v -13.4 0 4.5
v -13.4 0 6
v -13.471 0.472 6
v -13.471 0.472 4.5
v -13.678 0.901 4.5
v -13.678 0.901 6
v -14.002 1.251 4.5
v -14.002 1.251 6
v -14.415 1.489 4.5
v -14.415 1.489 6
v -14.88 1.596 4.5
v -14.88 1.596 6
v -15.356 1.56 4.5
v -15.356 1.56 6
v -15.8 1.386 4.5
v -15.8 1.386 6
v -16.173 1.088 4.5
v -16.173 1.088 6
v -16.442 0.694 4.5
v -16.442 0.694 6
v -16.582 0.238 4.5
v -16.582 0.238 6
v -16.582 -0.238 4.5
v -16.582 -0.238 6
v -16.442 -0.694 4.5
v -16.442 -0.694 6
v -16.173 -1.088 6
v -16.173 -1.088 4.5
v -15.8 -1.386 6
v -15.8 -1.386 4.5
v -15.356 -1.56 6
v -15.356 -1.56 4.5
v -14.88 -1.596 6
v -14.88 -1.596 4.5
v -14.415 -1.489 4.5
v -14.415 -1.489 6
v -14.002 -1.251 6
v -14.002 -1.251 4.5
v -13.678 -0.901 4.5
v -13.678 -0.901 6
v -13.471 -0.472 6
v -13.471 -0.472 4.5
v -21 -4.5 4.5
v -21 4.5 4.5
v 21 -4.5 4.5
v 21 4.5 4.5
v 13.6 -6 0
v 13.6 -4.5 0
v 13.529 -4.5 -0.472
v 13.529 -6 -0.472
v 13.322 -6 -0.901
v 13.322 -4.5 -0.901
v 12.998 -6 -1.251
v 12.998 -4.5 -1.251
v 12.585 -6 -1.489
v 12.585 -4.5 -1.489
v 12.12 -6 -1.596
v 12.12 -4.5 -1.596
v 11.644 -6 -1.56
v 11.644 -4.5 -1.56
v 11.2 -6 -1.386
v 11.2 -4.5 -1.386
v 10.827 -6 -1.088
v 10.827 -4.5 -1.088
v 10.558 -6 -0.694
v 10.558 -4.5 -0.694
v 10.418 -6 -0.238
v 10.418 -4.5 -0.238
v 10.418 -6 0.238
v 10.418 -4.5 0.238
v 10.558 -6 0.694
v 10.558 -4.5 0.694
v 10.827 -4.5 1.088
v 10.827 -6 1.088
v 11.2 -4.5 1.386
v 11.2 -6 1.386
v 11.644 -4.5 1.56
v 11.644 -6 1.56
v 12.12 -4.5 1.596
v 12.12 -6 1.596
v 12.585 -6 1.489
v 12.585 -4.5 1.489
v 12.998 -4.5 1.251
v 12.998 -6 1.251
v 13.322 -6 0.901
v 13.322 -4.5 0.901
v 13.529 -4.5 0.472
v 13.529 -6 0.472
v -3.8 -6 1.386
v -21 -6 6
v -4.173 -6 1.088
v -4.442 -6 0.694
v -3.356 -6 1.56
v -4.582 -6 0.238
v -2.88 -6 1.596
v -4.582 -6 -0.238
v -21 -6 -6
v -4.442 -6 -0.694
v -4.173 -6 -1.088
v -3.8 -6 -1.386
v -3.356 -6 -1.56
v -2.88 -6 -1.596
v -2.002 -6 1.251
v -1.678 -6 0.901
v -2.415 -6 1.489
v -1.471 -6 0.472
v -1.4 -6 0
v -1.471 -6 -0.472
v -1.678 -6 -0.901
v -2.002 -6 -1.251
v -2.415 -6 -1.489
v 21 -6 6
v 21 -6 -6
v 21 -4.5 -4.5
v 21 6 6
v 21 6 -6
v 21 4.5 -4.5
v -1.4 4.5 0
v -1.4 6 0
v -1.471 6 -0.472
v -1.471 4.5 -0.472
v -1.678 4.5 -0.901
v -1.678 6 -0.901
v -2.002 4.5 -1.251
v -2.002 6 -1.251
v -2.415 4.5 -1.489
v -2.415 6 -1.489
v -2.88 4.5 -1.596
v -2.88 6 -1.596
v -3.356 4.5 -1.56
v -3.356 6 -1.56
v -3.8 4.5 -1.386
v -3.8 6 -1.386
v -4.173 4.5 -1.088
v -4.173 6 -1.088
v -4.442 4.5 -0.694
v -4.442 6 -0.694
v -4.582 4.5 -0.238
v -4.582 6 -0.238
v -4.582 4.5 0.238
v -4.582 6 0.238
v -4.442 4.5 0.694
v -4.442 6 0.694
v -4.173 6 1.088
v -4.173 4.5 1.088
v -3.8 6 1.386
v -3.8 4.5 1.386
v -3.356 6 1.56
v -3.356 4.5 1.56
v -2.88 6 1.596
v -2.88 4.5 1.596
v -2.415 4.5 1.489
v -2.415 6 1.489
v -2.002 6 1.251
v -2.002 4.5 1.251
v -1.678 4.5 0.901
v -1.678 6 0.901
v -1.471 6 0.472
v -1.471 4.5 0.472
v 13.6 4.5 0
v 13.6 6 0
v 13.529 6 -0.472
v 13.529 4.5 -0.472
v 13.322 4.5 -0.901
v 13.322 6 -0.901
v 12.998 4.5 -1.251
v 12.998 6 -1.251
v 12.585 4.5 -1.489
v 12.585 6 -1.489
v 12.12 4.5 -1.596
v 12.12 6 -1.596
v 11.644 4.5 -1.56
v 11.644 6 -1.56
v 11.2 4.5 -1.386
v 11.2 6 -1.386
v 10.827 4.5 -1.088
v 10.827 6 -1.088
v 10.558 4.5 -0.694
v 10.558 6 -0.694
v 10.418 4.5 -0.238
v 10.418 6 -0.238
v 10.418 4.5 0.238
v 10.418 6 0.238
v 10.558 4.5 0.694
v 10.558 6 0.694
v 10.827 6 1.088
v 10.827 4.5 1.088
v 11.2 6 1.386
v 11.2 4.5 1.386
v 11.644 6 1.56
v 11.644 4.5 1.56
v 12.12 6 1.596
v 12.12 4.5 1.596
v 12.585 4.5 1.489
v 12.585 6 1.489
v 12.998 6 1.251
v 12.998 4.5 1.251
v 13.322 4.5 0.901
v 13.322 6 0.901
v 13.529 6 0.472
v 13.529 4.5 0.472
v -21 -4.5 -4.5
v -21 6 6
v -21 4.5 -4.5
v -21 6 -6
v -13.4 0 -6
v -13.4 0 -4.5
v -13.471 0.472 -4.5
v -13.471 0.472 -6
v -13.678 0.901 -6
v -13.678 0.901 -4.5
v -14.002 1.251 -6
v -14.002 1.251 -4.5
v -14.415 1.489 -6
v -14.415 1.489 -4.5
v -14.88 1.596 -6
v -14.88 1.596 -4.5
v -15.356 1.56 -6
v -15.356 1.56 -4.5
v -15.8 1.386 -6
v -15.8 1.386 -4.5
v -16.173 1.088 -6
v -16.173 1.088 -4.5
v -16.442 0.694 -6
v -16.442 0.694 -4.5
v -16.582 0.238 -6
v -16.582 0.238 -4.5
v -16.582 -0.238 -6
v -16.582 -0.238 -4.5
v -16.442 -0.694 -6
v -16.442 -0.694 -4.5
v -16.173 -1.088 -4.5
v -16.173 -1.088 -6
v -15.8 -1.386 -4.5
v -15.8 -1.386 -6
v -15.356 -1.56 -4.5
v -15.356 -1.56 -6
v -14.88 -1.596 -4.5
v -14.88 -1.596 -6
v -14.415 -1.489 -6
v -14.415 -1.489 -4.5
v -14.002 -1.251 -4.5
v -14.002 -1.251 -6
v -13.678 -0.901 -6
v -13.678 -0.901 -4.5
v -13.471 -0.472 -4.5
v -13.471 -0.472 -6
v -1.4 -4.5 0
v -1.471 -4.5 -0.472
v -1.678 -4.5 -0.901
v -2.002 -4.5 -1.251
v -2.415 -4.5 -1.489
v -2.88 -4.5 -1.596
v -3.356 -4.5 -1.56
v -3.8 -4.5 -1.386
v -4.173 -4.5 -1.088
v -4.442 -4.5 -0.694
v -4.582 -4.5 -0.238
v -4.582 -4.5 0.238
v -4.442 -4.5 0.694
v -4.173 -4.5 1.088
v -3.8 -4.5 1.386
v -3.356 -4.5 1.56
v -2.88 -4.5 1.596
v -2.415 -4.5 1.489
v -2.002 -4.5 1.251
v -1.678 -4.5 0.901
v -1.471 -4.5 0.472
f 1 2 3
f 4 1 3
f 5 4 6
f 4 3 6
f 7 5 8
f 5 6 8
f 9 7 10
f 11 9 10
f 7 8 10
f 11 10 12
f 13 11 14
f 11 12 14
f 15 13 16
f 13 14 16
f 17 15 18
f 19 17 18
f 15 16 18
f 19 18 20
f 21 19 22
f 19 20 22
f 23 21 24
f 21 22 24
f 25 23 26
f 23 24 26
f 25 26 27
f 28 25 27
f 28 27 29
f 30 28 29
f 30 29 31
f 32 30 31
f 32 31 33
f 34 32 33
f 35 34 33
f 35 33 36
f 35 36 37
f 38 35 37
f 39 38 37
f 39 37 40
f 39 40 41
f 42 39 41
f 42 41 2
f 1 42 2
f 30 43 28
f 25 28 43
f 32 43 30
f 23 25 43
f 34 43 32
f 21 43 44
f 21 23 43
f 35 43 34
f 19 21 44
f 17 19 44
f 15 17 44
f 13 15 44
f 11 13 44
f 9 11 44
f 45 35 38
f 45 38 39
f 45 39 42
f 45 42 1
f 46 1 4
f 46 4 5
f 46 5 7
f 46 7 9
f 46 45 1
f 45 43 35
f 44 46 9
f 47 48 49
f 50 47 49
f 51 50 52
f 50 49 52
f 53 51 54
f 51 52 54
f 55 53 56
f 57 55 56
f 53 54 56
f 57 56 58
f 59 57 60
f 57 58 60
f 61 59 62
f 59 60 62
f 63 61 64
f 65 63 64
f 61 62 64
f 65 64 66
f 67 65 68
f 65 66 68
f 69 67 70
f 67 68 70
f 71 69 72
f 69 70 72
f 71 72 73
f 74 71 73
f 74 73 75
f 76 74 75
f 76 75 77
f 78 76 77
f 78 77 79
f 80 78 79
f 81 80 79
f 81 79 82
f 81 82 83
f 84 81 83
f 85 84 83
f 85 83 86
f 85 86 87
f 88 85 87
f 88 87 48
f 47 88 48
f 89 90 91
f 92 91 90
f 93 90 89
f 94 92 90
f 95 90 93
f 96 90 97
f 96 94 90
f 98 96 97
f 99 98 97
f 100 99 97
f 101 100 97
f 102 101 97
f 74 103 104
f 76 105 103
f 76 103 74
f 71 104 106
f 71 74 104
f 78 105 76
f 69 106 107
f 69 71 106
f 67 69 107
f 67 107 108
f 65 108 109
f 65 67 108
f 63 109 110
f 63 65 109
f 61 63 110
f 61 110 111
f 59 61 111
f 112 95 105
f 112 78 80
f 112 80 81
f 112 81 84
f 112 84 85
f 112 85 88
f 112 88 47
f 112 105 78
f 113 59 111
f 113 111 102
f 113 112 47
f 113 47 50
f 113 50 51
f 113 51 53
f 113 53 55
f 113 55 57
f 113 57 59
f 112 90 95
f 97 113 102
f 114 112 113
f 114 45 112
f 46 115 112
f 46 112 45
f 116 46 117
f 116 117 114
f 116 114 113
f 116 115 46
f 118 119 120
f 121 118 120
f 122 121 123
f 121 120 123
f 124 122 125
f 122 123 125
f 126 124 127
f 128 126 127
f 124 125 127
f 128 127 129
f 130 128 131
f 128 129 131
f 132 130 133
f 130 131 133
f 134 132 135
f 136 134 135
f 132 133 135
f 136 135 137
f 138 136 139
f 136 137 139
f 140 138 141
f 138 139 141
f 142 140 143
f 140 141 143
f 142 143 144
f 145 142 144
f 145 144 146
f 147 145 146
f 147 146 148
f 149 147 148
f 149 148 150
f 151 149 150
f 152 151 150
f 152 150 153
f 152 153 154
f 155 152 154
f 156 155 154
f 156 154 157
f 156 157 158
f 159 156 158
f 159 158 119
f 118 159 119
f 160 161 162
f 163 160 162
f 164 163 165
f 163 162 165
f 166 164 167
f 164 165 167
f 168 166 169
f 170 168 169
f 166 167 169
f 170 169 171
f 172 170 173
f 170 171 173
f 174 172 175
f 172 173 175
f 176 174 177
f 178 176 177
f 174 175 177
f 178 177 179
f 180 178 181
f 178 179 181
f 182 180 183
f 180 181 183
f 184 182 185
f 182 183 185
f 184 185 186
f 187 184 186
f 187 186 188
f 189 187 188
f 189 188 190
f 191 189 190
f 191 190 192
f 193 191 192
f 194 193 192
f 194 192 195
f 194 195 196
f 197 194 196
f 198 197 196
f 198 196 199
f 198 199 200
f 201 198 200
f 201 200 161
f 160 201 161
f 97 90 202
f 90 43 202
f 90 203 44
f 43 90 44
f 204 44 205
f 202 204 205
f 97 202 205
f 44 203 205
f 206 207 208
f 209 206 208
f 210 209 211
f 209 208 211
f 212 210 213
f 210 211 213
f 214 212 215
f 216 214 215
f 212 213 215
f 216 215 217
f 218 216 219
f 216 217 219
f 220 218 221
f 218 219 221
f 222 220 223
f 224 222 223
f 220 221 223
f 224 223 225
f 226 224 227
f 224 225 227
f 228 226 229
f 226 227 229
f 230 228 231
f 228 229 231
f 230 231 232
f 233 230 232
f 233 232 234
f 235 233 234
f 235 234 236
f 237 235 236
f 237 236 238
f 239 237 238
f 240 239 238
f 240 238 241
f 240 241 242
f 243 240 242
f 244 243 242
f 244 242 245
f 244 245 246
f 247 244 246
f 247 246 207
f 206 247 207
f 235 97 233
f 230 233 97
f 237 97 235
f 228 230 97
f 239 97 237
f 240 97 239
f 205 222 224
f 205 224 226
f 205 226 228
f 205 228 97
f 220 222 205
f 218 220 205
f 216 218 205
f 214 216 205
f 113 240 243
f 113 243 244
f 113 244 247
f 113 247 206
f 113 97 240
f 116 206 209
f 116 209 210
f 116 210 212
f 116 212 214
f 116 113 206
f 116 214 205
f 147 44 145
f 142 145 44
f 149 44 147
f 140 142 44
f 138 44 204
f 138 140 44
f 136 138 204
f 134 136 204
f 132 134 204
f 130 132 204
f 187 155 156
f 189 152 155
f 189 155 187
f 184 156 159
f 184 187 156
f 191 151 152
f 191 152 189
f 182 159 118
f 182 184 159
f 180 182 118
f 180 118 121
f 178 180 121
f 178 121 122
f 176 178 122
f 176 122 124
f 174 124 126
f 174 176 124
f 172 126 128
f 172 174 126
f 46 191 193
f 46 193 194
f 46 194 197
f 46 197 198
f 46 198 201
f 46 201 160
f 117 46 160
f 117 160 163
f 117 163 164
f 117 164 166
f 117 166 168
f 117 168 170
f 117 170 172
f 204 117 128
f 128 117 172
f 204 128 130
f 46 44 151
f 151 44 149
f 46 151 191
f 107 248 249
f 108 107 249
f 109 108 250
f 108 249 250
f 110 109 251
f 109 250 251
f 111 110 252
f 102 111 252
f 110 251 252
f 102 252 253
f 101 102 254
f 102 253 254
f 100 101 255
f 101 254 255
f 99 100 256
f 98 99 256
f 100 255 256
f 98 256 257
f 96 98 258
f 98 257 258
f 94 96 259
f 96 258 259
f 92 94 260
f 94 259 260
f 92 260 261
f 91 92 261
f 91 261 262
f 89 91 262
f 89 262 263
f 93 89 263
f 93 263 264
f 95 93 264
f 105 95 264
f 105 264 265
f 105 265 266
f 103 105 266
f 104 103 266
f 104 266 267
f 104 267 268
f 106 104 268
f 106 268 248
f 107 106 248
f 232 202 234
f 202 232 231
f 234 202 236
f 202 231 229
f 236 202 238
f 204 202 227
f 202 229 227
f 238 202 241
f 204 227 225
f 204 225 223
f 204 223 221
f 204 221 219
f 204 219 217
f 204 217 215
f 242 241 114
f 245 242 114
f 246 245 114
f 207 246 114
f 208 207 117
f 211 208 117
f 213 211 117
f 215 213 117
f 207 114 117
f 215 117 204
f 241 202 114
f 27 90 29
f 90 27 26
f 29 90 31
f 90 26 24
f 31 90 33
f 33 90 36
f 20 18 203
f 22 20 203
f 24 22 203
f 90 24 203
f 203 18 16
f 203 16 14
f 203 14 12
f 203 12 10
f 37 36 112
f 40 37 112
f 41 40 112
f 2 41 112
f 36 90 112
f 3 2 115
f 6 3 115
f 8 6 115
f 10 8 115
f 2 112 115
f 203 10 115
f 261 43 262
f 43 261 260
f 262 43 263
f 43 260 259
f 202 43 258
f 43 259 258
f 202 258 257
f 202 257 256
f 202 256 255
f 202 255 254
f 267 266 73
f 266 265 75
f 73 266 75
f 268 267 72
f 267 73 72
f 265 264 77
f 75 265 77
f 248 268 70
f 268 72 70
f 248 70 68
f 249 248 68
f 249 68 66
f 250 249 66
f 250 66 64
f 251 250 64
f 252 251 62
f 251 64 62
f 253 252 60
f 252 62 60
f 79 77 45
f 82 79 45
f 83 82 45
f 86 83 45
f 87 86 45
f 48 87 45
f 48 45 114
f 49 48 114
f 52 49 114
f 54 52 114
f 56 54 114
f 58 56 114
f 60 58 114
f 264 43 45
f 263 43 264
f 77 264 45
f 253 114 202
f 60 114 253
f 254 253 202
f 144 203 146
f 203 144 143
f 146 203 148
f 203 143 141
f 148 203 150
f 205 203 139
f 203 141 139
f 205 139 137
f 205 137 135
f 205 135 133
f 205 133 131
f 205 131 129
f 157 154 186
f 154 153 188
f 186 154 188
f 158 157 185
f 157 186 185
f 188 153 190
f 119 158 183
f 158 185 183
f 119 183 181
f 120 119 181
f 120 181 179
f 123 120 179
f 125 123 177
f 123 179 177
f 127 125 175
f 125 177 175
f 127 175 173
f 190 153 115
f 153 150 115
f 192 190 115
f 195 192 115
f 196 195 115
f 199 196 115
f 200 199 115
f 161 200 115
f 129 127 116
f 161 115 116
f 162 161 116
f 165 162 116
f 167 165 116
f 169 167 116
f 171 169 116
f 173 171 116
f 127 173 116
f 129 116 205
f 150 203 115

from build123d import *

# Parameters (mm, degrees)
SKETCH_1_W          = 12
SKETCH_1_H          = 12
SKETCH_1_W_2        = 9
SKETCH_1_H_2        = 9
EXTRUDE_1_DEPTH     = 21
SKETCH_4_R          = 1.6
CUT_EXTRUDE_3_DEPTH = 13
SKETCH_5_R          = 1.6
CUT_EXTRUDE_4_DEPTH = 13


with BuildPart() as part:
    # ｽｹｯﾁ1 → ﾎﾞｽ - 押し出し1 (new body, symmetric)
    with BuildSketch(Plane(origin=(0, 0, 0), x_dir=(0, 0, -1), z_dir=(1, 0, 0))):
        Rectangle(SKETCH_1_W, SKETCH_1_H)
        Rectangle(SKETCH_1_W_2, SKETCH_1_H_2, mode=Mode.SUBTRACT)
    extrude(amount=EXTRUDE_1_DEPTH, both=True)

    # ｽｹｯﾁ4 → ｶｯﾄ - 押し出し3 (cut, through all)
    with BuildSketch(Plane(origin=(0, 6, 0), x_dir=(1, 0, 0), z_dir=(0, 1, 0))):
        with Locations((-3, 0)):
            Circle(SKETCH_4_R)
        with Locations((12, 0)):
            Circle(SKETCH_4_R)
    extrude(amount=-CUT_EXTRUDE_3_DEPTH, mode=Mode.SUBTRACT)

    # ｽｹｯﾁ5 → ｶｯﾄ - 押し出し4 (cut, through all)
    with BuildSketch(Plane.XY.offset(6)):
        with Locations((-15, 0)):
            Circle(SKETCH_5_R)
    extrude(amount=-CUT_EXTRUDE_4_DEPTH, mode=Mode.SUBTRACT)


solid = part.part
